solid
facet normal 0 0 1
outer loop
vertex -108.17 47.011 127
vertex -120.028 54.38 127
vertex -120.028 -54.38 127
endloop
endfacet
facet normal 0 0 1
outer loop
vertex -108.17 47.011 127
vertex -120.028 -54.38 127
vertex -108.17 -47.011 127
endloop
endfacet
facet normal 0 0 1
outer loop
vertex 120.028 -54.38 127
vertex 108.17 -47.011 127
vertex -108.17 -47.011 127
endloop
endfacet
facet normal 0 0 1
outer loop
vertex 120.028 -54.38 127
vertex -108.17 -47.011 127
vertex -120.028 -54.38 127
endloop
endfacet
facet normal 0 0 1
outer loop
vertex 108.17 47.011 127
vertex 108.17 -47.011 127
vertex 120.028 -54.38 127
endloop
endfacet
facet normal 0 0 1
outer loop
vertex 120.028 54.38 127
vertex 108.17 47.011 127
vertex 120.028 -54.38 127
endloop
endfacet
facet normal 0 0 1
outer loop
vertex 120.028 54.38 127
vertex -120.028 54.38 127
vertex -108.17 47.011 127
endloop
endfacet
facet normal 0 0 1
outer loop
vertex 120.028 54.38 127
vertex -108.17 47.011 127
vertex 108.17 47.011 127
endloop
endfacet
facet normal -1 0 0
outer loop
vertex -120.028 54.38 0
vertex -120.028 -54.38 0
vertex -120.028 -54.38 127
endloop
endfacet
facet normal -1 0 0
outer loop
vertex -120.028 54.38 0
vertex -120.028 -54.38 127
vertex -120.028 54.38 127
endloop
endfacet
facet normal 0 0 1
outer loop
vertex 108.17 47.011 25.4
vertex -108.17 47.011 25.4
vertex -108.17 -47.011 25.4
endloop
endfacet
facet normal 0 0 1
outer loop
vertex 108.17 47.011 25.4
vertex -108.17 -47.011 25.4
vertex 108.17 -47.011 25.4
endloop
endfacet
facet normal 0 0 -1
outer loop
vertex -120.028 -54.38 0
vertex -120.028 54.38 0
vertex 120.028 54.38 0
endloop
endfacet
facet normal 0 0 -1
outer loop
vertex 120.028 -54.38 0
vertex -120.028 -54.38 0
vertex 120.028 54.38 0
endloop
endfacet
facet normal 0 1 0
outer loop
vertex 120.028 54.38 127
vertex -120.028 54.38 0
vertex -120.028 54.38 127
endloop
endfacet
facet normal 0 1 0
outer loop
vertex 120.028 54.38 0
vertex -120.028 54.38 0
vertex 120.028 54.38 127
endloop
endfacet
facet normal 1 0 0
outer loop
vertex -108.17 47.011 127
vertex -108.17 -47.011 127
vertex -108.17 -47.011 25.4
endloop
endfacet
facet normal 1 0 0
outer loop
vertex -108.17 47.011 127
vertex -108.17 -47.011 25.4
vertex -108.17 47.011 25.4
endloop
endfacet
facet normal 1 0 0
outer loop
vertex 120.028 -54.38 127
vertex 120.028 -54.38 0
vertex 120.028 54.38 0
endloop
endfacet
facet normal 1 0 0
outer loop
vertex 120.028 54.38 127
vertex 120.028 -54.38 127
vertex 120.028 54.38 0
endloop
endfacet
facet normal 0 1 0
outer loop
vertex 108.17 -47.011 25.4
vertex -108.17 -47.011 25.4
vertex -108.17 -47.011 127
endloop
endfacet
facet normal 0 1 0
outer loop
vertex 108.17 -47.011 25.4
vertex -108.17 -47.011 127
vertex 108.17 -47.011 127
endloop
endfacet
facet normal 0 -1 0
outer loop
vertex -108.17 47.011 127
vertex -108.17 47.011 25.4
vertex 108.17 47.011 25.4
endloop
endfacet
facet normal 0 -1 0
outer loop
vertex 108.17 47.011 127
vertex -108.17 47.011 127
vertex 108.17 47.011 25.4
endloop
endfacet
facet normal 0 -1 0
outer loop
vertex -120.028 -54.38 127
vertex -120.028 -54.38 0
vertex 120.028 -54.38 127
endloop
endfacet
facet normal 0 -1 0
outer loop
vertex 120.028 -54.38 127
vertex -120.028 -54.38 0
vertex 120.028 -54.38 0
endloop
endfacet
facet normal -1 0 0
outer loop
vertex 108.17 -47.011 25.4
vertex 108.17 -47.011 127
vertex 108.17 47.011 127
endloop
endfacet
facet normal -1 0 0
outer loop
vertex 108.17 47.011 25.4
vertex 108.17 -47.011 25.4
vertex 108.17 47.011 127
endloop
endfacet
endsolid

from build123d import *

# Parameters (mm, degrees)
F0_W     = 216.339796
F0_H     = 94.022334
F3_DEPTH = 25.4
F1_W     = 231.186748
F1_H     = 102.275074
F1_W_2   = 216.339796
F1_H_2   = 94.022334
F4_DEPTH = 50.8
F2_W     = 240.056262
F2_H     = 108.75938
F2_W_2   = 216.339796
F2_H_2   = 94.022334
F5_DEPTH = 127


with BuildPart() as f3:
    # F0 (on Top) → F3 (new body)
    with BuildSketch(Plane.XY):
        Rectangle(F0_W, F0_H)
    extrude(amount=F3_DEPTH)

    # F1 (on face) → F4 (join)
    with BuildSketch(Plane.XY):
        Rectangle(F1_W, F1_H)
        Rectangle(F1_W_2, F1_H_2, mode=Mode.SUBTRACT)
    extrude(amount=F4_DEPTH)

    # F2 (on face) → F5 (join)
    with BuildSketch(Plane.XY):
        Rectangle(F2_W, F2_H)
        Rectangle(F2_W_2, F2_H_2, mode=Mode.SUBTRACT)
    extrude(amount=F5_DEPTH)


solid = f3.part
